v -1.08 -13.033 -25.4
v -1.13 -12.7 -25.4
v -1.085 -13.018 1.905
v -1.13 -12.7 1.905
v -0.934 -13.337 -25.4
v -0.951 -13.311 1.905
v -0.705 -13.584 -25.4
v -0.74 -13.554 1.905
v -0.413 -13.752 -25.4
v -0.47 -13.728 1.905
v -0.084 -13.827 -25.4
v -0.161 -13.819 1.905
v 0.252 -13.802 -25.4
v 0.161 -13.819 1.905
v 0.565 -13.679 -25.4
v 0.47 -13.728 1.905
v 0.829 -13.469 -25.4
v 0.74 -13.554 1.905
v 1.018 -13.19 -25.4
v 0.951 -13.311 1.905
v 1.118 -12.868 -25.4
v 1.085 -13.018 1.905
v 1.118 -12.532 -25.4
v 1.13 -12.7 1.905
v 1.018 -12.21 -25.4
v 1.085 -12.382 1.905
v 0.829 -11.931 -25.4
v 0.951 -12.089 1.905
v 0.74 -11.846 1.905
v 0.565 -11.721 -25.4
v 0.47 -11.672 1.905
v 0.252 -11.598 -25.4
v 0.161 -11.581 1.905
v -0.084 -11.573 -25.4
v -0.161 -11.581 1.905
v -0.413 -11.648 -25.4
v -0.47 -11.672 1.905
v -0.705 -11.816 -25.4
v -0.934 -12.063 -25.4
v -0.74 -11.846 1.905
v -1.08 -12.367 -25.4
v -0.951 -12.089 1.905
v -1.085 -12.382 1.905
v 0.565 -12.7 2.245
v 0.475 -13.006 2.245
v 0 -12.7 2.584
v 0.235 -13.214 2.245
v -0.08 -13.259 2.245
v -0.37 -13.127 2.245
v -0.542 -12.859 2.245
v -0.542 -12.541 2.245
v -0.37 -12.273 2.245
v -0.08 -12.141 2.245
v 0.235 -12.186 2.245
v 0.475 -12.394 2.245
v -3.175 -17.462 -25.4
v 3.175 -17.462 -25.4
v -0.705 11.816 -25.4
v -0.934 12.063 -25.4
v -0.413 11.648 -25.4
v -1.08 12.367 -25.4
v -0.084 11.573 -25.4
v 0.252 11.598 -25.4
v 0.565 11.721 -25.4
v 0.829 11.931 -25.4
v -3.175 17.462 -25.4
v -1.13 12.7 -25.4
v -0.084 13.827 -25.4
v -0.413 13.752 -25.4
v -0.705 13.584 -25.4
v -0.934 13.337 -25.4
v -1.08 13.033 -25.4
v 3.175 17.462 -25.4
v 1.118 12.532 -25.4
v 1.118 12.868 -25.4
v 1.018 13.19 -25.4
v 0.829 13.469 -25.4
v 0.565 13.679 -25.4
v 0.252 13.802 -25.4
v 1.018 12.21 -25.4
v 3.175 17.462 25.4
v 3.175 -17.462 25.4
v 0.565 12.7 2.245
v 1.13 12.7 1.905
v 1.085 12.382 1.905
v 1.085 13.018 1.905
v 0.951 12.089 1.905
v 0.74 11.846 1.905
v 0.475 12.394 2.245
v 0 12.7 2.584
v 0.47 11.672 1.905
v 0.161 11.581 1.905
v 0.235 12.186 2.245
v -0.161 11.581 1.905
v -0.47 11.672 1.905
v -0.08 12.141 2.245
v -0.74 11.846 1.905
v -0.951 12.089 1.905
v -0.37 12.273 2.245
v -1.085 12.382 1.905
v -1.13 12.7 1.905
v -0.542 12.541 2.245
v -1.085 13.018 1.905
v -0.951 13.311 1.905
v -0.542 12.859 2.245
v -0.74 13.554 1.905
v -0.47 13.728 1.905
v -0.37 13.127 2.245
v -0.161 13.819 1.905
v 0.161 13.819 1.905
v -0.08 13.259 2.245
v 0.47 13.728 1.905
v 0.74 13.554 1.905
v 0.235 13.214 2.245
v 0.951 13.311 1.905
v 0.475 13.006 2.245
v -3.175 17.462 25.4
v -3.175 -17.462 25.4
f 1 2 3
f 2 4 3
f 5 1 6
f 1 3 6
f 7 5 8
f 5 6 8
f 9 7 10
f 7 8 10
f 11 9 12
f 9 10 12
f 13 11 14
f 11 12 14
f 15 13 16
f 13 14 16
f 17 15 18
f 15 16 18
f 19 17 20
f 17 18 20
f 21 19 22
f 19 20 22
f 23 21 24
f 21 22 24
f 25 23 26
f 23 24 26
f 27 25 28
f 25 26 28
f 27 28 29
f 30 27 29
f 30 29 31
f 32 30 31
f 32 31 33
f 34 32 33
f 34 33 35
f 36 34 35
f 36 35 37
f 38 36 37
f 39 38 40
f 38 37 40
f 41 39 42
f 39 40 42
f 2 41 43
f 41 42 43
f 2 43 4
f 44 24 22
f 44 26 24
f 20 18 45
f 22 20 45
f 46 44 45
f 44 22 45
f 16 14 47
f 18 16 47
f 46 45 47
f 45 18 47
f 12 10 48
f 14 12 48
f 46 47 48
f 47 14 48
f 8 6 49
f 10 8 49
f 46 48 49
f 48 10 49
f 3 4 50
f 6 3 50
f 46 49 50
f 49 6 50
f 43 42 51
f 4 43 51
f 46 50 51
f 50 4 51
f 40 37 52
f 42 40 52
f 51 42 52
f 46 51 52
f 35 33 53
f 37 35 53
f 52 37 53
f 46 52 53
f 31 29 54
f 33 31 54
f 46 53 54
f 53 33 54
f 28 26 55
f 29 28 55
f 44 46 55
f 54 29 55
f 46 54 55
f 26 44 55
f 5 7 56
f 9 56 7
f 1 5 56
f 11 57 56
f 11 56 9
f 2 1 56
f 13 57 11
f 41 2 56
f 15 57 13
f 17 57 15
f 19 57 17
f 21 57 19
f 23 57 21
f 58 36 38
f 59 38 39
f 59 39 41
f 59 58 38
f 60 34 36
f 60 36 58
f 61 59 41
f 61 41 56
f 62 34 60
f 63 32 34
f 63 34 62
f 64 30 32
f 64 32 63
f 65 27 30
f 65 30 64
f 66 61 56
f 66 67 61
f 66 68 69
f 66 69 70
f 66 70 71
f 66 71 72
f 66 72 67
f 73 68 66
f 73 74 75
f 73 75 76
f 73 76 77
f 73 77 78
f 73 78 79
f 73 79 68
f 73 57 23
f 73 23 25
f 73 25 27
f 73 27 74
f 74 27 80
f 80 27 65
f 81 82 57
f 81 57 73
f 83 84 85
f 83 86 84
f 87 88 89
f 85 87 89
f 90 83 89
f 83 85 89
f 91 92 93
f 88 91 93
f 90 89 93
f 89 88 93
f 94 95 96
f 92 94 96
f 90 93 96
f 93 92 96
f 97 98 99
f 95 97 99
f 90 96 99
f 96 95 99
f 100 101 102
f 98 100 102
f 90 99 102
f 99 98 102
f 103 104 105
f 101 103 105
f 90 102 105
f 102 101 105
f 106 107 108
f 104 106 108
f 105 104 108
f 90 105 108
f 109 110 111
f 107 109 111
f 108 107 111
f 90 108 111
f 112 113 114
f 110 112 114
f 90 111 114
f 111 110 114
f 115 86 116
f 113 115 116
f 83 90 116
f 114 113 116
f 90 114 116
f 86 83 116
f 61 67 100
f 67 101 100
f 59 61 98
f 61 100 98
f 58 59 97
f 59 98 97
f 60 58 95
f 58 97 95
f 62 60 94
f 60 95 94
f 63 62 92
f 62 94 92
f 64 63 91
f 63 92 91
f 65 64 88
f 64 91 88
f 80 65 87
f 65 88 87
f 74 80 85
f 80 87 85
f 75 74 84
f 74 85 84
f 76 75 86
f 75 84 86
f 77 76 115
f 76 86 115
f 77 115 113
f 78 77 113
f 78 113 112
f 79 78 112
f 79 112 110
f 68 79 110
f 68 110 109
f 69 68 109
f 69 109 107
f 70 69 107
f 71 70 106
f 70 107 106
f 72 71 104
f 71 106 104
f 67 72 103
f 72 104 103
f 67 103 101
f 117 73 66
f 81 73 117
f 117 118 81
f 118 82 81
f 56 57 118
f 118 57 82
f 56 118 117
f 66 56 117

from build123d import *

# Parameters (mm, degrees)
F0_W     = 34.925
F0_H     = 50.8
F1_DEPTH = 3.175
F3_D     = 2.2606
F3_DEPTH = 27.305
F3_TIP   = 0.6791527577


with BuildPart() as f1:
    # F0 (on Right) → F1 (new body, symmetric)
    with BuildSketch(Plane.YZ):
        Rectangle(F0_W, F0_H)
    extrude(amount=F1_DEPTH, both=True)

    # F3
    with Locations(Plane(origin=(0, 0, -25.4), x_dir=(1, 0, 0), z_dir=(0, 0, -1))):
        with Locations((0, 12.7), (0, -12.7)):
            Hole(F3_D / 2, depth=F3_DEPTH)
            with Locations((0, 0, -(F3_DEPTH + F3_TIP / 2))):  # 118° drill point
                Cone(0, F3_D / 2, F3_TIP, mode=Mode.SUBTRACT)


solid = f1.part
